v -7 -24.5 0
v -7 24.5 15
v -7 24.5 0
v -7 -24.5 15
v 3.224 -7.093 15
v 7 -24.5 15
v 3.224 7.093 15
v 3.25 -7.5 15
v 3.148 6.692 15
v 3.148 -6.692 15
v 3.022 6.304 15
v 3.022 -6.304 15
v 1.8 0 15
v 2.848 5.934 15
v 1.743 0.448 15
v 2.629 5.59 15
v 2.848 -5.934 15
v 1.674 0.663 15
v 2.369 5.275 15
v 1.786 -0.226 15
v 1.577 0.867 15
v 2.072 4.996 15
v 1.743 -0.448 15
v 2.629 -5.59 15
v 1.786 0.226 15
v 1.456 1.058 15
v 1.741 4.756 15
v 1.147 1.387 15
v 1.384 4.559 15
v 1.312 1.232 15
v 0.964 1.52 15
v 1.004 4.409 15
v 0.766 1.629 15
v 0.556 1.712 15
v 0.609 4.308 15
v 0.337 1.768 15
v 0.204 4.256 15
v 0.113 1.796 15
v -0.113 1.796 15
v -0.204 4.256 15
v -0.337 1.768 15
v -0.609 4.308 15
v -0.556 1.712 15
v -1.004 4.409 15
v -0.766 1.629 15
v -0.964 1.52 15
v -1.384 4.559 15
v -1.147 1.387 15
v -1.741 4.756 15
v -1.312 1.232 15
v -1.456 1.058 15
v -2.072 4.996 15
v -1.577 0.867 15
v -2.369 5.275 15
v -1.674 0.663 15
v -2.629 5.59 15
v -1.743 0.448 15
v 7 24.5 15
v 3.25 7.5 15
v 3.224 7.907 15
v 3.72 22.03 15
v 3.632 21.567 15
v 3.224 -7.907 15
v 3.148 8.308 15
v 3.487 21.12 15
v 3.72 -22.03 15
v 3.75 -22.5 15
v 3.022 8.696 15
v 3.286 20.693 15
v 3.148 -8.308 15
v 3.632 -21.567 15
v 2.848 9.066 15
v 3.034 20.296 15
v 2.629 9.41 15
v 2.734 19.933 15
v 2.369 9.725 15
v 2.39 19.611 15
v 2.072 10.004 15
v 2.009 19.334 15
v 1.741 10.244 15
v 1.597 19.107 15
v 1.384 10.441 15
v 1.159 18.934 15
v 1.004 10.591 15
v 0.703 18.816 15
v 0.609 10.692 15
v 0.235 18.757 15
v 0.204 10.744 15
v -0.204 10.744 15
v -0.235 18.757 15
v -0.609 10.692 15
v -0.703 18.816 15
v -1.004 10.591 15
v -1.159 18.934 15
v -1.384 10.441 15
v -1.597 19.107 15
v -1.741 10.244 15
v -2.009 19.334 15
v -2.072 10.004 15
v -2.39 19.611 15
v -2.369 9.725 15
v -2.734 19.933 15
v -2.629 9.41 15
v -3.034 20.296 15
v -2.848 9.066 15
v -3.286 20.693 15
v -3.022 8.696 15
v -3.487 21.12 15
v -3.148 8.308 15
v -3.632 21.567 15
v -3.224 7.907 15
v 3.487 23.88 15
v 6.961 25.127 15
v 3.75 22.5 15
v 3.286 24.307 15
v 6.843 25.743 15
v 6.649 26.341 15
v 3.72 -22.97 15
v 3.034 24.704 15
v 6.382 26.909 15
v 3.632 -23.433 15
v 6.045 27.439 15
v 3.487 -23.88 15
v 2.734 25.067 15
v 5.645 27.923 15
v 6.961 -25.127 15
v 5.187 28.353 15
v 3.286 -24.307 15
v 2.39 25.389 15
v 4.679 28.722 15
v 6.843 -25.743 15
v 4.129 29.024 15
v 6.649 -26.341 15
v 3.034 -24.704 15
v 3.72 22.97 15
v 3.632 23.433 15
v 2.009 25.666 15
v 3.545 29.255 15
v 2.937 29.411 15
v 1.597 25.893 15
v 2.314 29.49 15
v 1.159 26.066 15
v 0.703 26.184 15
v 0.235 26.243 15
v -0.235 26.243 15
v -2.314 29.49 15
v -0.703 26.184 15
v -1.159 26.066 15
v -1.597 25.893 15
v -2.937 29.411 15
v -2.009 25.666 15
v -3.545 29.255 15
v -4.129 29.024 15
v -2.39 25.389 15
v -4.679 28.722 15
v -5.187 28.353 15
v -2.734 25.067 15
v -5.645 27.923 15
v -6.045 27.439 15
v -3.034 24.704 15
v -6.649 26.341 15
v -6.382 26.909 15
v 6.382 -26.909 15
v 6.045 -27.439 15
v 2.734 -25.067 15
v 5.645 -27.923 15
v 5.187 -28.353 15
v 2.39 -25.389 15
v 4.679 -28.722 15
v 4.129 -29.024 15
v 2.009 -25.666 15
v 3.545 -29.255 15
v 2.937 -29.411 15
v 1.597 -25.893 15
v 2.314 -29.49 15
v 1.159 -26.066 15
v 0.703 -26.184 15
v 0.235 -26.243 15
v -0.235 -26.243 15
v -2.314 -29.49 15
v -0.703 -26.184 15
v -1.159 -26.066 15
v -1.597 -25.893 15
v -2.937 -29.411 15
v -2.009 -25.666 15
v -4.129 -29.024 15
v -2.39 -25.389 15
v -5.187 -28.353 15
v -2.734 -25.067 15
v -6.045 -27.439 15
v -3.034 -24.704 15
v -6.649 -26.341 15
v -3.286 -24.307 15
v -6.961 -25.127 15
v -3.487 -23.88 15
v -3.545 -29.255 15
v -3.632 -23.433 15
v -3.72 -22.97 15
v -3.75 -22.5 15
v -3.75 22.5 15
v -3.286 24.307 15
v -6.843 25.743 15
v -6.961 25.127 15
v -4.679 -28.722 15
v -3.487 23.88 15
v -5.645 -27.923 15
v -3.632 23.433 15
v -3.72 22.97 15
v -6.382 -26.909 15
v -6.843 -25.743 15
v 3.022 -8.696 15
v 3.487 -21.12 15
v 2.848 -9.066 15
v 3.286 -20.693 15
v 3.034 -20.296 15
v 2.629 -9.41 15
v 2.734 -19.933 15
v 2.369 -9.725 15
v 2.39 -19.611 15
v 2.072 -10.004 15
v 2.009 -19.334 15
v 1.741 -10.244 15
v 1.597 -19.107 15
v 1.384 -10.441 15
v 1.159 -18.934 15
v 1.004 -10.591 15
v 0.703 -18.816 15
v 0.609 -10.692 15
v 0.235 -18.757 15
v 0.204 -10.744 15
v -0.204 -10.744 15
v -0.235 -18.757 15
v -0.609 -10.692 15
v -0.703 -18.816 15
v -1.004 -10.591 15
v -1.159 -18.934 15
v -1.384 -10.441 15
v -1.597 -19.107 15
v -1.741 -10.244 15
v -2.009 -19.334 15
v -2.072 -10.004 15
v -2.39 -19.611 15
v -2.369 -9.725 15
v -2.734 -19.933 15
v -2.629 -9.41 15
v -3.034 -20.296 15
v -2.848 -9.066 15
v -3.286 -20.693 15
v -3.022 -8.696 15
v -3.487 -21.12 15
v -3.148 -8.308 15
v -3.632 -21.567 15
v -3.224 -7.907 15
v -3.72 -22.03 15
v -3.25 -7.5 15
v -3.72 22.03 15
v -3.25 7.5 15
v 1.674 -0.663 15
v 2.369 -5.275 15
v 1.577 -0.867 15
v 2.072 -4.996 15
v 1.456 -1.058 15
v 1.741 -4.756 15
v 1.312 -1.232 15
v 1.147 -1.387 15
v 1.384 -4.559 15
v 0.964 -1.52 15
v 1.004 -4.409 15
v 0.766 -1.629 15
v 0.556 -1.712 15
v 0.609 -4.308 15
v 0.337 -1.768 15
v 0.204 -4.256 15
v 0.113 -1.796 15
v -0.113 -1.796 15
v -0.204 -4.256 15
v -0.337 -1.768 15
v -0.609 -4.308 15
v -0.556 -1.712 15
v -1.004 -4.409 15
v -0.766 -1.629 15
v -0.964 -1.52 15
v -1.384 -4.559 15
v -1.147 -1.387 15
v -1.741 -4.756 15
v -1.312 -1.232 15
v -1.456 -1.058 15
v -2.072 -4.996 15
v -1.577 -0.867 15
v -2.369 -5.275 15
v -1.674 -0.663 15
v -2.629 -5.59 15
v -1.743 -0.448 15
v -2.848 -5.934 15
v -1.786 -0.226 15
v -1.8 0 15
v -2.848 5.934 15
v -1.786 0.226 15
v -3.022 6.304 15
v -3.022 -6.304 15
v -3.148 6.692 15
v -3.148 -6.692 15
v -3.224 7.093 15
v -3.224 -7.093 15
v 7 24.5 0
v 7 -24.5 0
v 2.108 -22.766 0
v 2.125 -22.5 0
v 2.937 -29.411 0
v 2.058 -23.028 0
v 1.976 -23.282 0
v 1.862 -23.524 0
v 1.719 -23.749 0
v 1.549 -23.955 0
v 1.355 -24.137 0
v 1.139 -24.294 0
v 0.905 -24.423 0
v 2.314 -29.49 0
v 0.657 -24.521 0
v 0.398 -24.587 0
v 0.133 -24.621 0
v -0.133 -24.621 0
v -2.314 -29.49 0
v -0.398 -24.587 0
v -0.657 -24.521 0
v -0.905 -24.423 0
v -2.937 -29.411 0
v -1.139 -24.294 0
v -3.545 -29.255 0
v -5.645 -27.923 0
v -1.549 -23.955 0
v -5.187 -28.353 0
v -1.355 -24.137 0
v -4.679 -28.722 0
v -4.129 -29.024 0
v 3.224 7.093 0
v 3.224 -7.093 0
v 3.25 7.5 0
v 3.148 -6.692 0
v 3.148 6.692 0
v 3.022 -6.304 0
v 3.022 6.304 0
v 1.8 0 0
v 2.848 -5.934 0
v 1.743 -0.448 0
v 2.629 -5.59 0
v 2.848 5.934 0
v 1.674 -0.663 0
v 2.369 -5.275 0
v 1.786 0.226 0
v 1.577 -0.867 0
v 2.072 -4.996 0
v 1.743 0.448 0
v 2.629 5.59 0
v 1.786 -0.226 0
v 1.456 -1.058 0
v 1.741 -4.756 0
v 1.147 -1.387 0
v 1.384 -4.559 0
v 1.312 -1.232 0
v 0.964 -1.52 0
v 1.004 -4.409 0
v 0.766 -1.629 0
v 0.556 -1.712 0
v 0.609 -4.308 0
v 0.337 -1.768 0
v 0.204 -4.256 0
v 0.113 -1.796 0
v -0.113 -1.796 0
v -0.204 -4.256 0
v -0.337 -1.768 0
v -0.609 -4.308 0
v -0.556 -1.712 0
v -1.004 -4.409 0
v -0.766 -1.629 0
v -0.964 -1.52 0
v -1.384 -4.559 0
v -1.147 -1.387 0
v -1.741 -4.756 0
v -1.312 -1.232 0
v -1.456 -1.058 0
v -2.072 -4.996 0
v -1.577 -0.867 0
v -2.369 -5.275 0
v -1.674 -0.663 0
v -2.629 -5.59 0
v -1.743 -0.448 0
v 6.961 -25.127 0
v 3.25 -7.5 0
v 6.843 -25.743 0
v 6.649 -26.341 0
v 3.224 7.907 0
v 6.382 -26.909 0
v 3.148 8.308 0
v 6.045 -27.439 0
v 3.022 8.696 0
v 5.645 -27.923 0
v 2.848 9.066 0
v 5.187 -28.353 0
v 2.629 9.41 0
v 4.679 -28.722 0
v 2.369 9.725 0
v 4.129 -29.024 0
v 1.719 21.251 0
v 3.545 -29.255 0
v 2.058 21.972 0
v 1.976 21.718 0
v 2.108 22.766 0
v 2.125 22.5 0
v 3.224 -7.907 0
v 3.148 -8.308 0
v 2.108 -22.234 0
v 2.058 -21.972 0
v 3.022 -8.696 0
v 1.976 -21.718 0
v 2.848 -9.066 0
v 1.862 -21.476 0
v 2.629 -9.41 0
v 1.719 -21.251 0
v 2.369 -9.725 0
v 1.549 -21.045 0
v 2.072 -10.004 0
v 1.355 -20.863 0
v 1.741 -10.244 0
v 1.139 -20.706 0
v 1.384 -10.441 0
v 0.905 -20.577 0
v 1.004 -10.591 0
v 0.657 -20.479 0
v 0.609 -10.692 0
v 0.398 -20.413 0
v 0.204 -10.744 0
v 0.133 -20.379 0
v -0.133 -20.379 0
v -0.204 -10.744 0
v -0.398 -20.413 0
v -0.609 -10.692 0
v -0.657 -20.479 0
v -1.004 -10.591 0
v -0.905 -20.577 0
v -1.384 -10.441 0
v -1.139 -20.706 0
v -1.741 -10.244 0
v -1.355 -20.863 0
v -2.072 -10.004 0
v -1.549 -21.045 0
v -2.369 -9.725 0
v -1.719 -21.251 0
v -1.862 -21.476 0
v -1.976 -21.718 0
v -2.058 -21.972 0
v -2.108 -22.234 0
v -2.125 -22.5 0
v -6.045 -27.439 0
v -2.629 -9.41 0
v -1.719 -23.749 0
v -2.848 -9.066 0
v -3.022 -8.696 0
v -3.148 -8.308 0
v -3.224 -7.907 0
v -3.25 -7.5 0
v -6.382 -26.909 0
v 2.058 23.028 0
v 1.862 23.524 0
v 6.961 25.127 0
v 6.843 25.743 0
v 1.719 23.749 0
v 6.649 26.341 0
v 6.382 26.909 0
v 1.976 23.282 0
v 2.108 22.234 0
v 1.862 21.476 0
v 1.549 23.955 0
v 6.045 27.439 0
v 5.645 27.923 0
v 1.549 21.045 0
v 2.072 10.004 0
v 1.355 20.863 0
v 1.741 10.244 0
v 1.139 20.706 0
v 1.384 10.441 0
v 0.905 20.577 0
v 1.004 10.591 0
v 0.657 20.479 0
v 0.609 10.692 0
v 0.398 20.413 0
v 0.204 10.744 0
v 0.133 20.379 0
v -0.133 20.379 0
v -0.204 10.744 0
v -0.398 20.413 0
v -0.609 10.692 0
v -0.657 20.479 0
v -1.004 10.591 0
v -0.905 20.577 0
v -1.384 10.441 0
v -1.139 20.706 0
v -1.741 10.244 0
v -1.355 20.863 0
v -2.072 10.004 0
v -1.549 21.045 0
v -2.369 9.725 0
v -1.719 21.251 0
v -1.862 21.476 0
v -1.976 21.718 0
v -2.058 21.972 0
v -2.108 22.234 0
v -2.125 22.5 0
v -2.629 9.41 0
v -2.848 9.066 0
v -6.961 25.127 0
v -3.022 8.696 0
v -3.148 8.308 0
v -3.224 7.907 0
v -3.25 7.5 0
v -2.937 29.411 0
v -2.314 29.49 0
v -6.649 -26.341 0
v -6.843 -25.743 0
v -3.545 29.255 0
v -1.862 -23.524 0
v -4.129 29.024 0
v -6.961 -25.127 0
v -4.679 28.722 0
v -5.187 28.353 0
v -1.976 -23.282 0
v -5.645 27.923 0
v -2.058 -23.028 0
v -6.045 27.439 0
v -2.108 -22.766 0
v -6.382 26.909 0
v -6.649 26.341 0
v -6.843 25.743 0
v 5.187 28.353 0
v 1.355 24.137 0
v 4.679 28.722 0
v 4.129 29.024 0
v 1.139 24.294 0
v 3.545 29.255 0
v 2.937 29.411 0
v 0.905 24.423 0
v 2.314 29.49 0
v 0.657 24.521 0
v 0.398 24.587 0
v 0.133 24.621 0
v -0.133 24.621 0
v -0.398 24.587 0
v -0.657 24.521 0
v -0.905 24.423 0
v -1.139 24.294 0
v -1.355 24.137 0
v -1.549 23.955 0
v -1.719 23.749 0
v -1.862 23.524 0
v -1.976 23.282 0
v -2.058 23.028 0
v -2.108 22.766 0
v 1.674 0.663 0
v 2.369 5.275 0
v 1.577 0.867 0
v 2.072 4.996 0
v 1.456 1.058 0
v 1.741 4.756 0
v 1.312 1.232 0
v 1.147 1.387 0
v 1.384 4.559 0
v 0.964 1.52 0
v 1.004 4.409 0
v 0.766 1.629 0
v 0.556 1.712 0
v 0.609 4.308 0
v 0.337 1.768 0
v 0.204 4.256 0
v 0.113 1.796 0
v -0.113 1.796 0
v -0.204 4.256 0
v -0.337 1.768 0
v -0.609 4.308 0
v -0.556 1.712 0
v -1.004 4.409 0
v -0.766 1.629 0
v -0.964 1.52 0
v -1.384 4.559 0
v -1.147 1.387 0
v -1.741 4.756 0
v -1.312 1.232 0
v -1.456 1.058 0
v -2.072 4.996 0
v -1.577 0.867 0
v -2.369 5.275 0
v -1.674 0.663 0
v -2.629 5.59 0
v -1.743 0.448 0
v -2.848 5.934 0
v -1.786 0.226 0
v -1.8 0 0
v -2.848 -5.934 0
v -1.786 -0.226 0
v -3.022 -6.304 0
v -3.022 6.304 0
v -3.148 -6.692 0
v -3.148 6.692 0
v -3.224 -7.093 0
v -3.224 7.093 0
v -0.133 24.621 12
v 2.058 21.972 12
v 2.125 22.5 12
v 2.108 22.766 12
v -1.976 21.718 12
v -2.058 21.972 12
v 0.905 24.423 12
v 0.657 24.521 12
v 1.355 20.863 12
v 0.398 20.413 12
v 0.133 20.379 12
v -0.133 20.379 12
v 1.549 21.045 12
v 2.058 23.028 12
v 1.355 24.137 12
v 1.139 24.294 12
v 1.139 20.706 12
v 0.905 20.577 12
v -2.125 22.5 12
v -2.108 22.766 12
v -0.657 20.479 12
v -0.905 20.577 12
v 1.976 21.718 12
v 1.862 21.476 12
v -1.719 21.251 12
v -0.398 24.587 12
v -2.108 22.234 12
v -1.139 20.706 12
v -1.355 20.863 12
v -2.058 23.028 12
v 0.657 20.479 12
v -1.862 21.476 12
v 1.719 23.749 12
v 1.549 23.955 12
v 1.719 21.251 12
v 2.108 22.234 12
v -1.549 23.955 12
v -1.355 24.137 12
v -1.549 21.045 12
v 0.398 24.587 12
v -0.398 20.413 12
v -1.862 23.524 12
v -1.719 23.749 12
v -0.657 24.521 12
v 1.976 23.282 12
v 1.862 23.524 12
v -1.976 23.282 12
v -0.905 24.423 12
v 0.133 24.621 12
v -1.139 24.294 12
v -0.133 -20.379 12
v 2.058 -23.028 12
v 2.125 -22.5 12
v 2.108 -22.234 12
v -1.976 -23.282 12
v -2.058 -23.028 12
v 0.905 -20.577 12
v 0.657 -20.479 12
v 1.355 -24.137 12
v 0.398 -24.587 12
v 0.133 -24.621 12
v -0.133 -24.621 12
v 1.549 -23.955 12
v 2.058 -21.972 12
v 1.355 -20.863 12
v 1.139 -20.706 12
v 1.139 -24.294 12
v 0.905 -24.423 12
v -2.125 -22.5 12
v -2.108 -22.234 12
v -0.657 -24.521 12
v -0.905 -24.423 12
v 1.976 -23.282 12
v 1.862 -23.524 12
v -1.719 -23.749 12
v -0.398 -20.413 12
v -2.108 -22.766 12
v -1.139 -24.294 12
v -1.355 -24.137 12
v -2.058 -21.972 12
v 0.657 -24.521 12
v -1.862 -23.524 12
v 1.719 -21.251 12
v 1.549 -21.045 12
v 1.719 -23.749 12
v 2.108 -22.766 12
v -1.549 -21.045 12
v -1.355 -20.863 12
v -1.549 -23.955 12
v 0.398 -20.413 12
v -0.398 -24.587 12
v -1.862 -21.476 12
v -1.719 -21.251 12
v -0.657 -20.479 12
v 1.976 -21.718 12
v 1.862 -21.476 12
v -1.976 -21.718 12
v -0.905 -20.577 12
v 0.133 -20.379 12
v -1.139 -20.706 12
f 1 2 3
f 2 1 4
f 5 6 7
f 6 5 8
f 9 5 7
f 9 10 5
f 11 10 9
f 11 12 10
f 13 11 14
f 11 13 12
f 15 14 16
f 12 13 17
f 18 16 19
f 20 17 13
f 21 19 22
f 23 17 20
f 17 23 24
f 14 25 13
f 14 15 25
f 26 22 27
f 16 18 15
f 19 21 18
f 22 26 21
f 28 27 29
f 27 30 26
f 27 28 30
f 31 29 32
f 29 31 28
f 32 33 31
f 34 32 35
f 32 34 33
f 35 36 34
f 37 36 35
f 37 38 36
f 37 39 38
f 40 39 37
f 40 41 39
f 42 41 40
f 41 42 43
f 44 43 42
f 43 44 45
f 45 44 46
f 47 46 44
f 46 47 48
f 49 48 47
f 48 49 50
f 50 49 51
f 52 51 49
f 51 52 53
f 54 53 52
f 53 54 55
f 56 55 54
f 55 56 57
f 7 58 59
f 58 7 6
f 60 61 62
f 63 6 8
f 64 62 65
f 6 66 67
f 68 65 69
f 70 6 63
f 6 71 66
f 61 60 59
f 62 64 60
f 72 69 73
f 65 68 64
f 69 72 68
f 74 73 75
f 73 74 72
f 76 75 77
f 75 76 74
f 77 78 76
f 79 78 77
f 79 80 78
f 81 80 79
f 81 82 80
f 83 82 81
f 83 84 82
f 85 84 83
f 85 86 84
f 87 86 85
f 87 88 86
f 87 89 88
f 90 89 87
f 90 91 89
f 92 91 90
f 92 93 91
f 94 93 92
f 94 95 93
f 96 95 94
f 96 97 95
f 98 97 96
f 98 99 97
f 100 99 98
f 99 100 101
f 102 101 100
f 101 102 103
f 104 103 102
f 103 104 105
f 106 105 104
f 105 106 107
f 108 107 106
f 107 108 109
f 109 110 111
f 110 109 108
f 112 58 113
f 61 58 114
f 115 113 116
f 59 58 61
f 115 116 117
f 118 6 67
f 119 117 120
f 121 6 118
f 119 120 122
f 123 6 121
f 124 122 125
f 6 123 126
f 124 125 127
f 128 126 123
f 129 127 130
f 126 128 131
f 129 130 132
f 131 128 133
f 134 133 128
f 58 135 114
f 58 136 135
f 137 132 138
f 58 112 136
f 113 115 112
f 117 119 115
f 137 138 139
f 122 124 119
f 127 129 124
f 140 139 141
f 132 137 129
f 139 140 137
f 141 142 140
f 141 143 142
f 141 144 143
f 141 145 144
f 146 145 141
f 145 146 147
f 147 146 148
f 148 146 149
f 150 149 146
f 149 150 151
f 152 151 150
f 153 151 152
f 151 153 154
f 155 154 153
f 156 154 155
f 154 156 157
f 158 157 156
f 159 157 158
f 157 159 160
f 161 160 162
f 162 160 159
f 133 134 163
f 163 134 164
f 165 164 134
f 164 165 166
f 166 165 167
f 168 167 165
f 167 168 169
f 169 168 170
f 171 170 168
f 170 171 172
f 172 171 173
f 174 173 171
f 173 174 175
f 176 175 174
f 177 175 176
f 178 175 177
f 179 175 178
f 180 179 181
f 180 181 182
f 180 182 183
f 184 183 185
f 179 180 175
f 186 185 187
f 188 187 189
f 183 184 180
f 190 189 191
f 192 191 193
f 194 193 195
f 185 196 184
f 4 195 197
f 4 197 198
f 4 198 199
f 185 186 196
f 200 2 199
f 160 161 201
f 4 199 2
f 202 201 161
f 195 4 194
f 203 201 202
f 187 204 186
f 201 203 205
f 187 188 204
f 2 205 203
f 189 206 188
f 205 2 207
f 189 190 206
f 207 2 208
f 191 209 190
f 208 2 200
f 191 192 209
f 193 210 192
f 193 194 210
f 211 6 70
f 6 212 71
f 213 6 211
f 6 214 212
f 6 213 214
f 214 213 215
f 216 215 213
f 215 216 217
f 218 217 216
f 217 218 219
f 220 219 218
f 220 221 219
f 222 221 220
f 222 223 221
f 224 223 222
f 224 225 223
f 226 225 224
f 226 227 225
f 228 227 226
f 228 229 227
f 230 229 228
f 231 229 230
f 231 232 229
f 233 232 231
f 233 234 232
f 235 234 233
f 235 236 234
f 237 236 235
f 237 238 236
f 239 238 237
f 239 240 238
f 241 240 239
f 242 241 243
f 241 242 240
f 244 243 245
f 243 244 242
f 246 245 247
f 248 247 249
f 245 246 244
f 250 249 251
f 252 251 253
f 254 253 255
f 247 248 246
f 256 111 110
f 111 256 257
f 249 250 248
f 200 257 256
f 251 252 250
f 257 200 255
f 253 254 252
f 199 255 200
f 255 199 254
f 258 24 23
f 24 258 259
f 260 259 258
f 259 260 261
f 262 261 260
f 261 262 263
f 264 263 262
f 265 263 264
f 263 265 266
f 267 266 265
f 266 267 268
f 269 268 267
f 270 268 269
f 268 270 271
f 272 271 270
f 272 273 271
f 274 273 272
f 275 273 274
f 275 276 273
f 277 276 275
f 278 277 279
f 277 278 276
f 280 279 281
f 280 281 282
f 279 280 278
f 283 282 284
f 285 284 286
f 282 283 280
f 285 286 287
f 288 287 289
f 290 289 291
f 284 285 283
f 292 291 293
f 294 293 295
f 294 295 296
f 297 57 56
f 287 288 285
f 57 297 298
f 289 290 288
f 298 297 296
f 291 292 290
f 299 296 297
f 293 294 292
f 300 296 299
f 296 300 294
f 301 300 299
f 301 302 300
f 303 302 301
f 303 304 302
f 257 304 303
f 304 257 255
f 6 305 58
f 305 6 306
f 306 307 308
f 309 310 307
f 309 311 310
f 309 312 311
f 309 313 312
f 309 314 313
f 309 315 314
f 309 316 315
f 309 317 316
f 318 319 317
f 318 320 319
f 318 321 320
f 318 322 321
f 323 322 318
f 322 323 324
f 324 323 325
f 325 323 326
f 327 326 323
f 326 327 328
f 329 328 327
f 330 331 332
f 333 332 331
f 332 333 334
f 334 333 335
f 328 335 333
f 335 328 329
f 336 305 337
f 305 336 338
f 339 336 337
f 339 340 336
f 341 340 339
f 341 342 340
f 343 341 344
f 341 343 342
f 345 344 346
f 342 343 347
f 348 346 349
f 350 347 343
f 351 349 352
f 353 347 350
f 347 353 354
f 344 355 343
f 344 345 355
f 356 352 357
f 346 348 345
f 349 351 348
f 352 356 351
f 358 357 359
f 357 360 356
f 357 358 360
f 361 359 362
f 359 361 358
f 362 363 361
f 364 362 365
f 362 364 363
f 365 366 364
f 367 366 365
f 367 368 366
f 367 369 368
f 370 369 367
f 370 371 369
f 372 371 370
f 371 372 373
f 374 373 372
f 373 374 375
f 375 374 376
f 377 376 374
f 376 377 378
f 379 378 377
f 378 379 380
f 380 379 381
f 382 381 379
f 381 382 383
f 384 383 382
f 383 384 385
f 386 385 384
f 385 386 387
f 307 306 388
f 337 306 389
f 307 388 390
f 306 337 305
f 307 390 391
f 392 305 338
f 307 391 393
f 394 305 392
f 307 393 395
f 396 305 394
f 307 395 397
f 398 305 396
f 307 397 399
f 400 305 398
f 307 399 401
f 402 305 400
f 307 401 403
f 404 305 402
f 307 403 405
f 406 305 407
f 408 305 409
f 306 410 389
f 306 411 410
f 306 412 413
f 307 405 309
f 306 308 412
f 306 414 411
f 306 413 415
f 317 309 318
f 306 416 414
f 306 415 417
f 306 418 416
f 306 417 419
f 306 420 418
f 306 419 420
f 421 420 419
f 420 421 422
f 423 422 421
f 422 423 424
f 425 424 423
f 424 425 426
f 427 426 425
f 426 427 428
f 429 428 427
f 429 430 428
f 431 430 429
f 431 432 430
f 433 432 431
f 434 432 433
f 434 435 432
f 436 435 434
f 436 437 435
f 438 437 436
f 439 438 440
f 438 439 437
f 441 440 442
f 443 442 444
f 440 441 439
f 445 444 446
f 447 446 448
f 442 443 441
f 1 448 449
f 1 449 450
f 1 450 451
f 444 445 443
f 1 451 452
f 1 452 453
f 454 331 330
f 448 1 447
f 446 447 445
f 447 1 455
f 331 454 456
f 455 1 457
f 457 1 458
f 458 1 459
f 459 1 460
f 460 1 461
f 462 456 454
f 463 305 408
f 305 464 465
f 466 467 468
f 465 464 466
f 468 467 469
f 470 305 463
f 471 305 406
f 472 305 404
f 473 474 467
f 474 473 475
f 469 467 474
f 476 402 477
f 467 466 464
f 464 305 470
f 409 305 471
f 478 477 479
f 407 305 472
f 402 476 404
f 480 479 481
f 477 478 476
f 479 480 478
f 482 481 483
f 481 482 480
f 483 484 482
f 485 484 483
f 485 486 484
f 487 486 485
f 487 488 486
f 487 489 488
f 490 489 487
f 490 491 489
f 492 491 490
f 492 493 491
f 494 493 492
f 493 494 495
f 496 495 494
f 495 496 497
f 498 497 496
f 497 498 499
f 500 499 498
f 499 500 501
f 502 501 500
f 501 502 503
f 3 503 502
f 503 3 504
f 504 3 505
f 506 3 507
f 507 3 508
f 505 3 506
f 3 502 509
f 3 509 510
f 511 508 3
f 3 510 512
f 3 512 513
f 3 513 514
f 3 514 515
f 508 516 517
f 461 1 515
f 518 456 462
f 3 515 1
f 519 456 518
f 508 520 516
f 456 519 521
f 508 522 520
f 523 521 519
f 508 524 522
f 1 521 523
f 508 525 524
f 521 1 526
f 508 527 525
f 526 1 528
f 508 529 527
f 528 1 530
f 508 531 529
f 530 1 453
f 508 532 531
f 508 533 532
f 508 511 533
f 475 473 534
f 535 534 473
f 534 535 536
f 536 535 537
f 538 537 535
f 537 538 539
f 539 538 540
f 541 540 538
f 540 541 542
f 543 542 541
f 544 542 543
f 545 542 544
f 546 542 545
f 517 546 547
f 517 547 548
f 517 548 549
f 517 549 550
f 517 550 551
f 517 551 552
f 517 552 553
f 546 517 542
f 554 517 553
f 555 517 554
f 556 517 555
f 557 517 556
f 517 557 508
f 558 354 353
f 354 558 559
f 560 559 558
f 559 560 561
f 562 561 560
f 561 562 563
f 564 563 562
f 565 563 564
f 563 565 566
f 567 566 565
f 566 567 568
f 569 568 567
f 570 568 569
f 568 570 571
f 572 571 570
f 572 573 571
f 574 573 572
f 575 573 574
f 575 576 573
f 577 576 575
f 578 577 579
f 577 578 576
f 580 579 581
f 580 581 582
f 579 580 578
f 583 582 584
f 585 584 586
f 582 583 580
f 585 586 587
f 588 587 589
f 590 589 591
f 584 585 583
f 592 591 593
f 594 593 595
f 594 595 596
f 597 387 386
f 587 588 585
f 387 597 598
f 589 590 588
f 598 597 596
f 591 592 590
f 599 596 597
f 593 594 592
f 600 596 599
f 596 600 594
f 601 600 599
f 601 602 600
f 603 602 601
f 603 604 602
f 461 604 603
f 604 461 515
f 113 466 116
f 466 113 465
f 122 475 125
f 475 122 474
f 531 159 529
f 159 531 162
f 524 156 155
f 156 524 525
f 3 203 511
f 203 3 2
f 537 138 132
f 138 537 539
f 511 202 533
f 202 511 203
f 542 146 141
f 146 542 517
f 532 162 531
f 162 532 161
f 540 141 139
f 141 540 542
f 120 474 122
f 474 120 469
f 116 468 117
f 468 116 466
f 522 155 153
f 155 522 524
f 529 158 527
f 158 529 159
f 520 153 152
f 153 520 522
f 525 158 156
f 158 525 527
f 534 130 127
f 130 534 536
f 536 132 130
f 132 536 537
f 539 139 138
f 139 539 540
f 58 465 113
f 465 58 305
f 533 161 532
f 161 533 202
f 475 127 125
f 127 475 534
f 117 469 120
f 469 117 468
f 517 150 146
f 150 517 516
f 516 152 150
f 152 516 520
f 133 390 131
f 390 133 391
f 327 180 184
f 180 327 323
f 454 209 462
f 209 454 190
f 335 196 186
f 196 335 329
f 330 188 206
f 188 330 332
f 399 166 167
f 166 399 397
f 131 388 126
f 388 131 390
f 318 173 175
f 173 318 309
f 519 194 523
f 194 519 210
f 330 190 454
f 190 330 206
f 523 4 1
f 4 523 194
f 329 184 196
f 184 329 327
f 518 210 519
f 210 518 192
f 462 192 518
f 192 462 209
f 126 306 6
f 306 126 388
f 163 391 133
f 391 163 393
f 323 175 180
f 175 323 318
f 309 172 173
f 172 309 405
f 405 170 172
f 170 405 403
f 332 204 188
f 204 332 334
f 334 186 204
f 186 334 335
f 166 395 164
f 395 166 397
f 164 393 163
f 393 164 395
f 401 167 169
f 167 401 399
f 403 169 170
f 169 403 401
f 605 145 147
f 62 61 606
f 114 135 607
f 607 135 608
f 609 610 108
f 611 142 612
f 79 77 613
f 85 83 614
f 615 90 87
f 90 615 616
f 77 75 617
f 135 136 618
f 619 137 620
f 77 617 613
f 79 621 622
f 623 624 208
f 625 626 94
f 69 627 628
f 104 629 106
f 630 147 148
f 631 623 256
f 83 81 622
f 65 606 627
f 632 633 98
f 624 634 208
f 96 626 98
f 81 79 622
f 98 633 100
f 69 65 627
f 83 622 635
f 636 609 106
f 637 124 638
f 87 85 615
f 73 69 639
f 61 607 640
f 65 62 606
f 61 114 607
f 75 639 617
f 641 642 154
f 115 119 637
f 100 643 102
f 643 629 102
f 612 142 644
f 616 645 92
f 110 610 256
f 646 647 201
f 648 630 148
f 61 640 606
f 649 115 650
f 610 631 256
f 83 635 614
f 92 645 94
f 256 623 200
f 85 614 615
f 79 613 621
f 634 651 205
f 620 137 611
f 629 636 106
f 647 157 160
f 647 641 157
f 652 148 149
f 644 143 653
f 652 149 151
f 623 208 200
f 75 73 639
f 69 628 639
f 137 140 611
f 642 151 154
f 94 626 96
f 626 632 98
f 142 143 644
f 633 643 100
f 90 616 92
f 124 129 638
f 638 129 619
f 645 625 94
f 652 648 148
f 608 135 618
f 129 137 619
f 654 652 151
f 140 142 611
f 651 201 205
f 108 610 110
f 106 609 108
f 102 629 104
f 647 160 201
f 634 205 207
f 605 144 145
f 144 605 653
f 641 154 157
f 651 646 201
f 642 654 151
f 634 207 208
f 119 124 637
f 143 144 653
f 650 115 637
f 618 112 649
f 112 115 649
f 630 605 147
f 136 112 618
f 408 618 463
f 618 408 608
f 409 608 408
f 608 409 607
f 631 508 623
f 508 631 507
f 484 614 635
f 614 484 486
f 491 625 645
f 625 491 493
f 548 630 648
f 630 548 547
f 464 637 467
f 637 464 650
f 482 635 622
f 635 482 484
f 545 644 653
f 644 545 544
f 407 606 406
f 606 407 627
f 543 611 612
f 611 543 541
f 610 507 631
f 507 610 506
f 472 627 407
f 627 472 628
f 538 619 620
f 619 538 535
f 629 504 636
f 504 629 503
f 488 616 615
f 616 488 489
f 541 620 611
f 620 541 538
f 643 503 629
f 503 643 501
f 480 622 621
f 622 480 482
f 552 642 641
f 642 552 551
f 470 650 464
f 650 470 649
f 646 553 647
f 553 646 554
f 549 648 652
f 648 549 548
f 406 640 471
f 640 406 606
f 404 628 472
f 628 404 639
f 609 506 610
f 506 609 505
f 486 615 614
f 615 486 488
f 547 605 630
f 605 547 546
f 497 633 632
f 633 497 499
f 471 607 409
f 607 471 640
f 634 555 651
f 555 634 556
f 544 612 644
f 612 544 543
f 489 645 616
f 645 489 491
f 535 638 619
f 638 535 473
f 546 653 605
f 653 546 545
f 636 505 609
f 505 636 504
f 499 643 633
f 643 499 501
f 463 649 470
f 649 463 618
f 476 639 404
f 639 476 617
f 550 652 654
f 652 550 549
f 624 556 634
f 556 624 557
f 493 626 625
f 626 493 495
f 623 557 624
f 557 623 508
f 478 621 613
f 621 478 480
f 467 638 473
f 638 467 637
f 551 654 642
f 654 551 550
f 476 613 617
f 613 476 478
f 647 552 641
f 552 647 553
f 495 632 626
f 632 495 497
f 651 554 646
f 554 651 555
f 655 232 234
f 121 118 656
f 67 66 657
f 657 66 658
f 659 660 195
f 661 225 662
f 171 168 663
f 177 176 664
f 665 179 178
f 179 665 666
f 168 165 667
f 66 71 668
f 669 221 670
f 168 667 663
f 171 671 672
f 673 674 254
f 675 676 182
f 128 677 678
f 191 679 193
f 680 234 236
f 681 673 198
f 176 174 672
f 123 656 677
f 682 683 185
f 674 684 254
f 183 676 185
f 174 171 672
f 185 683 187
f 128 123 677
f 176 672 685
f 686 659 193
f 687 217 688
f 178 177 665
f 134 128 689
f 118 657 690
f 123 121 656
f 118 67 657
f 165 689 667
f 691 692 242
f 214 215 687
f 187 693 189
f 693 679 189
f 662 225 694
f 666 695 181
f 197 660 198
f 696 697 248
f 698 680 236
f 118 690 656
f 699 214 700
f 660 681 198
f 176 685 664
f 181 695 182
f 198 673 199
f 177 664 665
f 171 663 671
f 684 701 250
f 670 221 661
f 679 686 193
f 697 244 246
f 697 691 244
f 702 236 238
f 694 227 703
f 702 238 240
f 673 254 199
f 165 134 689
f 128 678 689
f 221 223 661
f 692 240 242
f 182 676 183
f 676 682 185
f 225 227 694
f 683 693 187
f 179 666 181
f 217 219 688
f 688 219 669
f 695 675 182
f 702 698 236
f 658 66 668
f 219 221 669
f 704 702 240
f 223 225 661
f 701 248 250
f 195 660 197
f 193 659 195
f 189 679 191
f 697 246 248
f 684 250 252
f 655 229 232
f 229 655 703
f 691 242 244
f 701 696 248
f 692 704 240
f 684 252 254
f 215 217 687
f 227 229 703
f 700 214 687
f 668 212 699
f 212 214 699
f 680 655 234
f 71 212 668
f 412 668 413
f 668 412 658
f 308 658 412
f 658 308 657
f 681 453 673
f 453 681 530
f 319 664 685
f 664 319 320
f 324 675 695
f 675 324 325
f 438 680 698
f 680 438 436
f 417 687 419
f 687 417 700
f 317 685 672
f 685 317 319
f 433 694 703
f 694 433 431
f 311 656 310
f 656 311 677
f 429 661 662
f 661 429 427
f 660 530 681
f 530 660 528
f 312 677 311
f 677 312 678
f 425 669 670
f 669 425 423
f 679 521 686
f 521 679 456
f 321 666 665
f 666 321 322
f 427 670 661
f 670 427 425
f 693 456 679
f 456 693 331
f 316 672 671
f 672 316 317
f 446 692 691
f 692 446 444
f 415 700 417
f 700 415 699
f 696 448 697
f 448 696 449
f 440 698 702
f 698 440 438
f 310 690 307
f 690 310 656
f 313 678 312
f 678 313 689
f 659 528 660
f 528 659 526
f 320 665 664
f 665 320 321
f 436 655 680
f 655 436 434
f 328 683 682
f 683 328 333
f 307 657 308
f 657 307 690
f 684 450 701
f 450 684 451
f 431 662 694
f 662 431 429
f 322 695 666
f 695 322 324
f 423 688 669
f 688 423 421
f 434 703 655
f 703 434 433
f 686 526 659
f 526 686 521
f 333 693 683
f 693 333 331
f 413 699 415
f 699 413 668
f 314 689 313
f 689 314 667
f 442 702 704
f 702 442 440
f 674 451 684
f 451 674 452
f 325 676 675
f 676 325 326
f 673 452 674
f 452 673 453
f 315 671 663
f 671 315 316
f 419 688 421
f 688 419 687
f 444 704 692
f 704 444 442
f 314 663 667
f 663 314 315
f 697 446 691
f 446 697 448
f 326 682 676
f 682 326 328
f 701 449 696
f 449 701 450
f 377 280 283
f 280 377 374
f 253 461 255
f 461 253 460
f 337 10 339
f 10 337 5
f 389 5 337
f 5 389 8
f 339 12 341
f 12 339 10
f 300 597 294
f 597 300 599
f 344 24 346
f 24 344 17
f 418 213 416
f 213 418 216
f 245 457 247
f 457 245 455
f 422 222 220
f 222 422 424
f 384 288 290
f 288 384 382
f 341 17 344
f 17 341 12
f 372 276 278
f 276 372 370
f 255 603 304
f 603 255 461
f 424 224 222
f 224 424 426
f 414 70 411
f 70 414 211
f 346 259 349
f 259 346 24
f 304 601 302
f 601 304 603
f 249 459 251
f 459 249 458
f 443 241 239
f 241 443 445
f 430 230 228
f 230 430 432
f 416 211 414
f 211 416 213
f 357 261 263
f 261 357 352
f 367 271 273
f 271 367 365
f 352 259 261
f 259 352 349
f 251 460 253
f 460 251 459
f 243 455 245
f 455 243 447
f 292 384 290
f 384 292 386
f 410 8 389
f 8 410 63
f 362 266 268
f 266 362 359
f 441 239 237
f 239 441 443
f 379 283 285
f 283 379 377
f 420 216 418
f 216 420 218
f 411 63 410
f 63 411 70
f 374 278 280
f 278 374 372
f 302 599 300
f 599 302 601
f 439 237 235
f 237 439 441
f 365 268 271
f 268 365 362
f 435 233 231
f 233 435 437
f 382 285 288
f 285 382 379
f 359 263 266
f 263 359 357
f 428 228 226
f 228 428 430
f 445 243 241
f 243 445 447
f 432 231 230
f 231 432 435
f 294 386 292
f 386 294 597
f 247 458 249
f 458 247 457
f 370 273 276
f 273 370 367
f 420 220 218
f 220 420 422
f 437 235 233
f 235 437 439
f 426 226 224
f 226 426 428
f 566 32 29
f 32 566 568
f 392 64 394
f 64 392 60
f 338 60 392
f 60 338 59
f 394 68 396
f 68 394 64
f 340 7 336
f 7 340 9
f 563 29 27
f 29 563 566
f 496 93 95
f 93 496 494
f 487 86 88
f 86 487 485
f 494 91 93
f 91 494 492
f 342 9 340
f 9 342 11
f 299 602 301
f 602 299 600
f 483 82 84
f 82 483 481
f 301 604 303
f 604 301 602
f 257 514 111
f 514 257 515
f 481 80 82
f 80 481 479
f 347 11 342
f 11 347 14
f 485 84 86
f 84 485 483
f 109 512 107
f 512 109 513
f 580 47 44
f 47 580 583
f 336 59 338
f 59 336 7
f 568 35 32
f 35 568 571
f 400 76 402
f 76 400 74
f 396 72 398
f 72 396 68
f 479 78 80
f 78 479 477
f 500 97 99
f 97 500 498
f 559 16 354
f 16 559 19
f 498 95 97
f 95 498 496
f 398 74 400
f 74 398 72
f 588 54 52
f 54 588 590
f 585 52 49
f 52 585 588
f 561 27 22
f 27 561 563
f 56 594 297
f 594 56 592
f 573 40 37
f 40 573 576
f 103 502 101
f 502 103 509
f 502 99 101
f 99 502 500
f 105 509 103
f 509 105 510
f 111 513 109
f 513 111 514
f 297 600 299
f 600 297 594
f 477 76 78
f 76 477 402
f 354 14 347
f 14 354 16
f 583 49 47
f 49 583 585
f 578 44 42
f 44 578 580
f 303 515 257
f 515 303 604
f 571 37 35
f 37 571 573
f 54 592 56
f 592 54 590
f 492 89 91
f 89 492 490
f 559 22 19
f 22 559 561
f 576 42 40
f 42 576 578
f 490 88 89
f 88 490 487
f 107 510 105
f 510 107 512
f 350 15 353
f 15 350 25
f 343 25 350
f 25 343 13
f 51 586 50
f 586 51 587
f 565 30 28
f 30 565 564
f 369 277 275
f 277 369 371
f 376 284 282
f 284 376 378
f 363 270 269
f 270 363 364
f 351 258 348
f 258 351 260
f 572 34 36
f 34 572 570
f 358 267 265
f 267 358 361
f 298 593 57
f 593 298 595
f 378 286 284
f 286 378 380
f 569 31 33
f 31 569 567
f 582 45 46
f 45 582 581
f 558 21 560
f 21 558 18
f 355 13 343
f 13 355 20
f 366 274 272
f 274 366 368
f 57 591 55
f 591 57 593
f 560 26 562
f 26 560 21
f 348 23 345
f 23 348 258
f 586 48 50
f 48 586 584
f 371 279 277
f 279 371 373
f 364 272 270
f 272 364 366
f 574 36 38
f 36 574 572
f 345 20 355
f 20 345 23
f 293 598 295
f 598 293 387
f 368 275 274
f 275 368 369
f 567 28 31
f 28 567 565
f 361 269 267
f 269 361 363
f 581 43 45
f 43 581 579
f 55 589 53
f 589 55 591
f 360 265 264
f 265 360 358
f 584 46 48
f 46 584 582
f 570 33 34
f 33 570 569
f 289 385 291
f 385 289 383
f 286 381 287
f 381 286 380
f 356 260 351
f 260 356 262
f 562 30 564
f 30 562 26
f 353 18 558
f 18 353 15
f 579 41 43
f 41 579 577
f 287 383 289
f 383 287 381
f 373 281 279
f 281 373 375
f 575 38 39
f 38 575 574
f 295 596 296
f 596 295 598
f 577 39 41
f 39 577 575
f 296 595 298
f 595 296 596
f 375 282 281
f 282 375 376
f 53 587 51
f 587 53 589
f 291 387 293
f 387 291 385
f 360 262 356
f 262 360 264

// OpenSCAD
$fn = 50;


difference() {
	union() {
		hull() {
			translate(v = [-2.0000000000, 9.5000000000, 0]) {
				cylinder(h = 15, r = 5);
			}
			translate(v = [2.0000000000, 9.5000000000, 0]) {
				cylinder(h = 15, r = 5);
			}
			translate(v = [-2.0000000000, -9.5000000000, 0]) {
				cylinder(h = 15, r = 5);
			}
			translate(v = [2.0000000000, -9.5000000000, 0]) {
				cylinder(h = 15, r = 5);
			}
		}
		translate(v = [0.0000000000, 15.0000000000, 0]) {
			hull() {
				translate(v = [-2.0000000000, 9.5000000000, 0]) {
					cylinder(h = 15, r = 5);
				}
				translate(v = [2.0000000000, 9.5000000000, 0]) {
					cylinder(h = 15, r = 5);
				}
				translate(v = [-2.0000000000, -9.5000000000, 0]) {
					cylinder(h = 15, r = 5);
				}
				translate(v = [2.0000000000, -9.5000000000, 0]) {
					cylinder(h = 15, r = 5);
				}
			}
		}
		translate(v = [0.0000000000, 15.0000000000, 0]) {
			hull() {
				translate(v = [-2.0000000000, 9.5000000000, 0]) {
					cylinder(h = 15, r = 5);
				}
				translate(v = [2.0000000000, 9.5000000000, 0]) {
					cylinder(h = 15, r = 5);
				}
				translate(v = [-2.0000000000, -9.5000000000, 0]) {
					cylinder(h = 15, r = 5);
				}
				translate(v = [2.0000000000, -9.5000000000, 0]) {
					cylinder(h = 15, r = 5);
				}
			}
		}
		translate(v = [0.0000000000, -15.0000000000, 0]) {
			hull() {
				translate(v = [-2.0000000000, 9.5000000000, 0]) {
					cylinder(h = 15, r = 5);
				}
				translate(v = [2.0000000000, 9.5000000000, 0]) {
					cylinder(h = 15, r = 5);
				}
				translate(v = [-2.0000000000, -9.5000000000, 0]) {
					cylinder(h = 15, r = 5);
				}
				translate(v = [2.0000000000, -9.5000000000, 0]) {
					cylinder(h = 15, r = 5);
				}
			}
		}
		translate(v = [0.0000000000, -15.0000000000, 0]) {
			hull() {
				translate(v = [-2.0000000000, 9.5000000000, 0]) {
					cylinder(h = 15, r = 5);
				}
				translate(v = [2.0000000000, 9.5000000000, 0]) {
					cylinder(h = 15, r = 5);
				}
				translate(v = [-2.0000000000, -9.5000000000, 0]) {
					cylinder(h = 15, r = 5);
				}
				translate(v = [2.0000000000, -9.5000000000, 0]) {
					cylinder(h = 15, r = 5);
				}
			}
		}
	}
	union() {
		translate(v = [0.0000000000, 22.5000000000, 15]) {
			rotate(a = [0, 0, 0]) {
				difference() {
					union() {
						#translate(v = [0, 0, -15.0000000000]) {
							cylinder(h = 15, r = 2.0000000000);
						}
						#translate(v = [0, 0, -3]) {
							cylinder(h = 3, r1 = 2.1250000000, r2 = 3.7500000000);
						}
						#translate(v = [0, 0, -15.0000000000]) {
							cylinder(h = 15, r = 2.1250000000);
						}
						#translate(v = [0, 0, -15.0000000000]) {
							cylinder(h = 15, r = 2.0000000000);
						}
					}
					union();
				}
			}
		}
		translate(v = [0.0000000000, 22.5000000000, 15]) {
			rotate(a = [0, 0, 0]) {
				difference() {
					union() {
						#translate(v = [0, 0, -15.0000000000]) {
							cylinder(h = 15, r = 2.0000000000);
						}
						#translate(v = [0, 0, -3]) {
							cylinder(h = 3, r1 = 2.1250000000, r2 = 3.7500000000);
						}
						#translate(v = [0, 0, -15.0000000000]) {
							cylinder(h = 15, r = 2.1250000000);
						}
						#translate(v = [0, 0, -15.0000000000]) {
							cylinder(h = 15, r = 2.0000000000);
						}
					}
					union();
				}
			}
		}
		translate(v = [0.0000000000, -22.5000000000, 15]) {
			rotate(a = [0, 0, 0]) {
				difference() {
					union() {
						#translate(v = [0, 0, -15.0000000000]) {
							cylinder(h = 15, r = 2.0000000000);
						}
						#translate(v = [0, 0, -3]) {
							cylinder(h = 3, r1 = 2.1250000000, r2 = 3.7500000000);
						}
						#translate(v = [0, 0, -15.0000000000]) {
							cylinder(h = 15, r = 2.1250000000);
						}
						#translate(v = [0, 0, -15.0000000000]) {
							cylinder(h = 15, r = 2.0000000000);
						}
					}
					union();
				}
			}
		}
		translate(v = [0.0000000000, -22.5000000000, 15]) {
			rotate(a = [0, 0, 0]) {
				difference() {
					union() {
						#translate(v = [0, 0, -15.0000000000]) {
							cylinder(h = 15, r = 2.0000000000);
						}
						#translate(v = [0, 0, -3]) {
							cylinder(h = 3, r1 = 2.1250000000, r2 = 3.7500000000);
						}
						#translate(v = [0, 0, -15.0000000000]) {
							cylinder(h = 15, r = 2.1250000000);
						}
						#translate(v = [0, 0, -15.0000000000]) {
							cylinder(h = 15, r = 2.0000000000);
						}
					}
					union();
				}
			}
		}
		translate(v = [0.0000000000, -7.5000000000, 0]) {
			translate(v = [0, 0, -100]) {
				cylinder(h = 200, r = 3.2500000000);
			}
		}
		translate(v = [0.0000000000, 7.5000000000, 0]) {
			translate(v = [0, 0, -100]) {
				cylinder(h = 200, r = 3.2500000000);
			}
		}
		translate(v = [0.0000000000, -7.5000000000, 0]) {
			translate(v = [0, 0, -100]) {
				cylinder(h = 200, r = 1.8000000000);
			}
		}
		translate(v = [0, 0, -100]) {
			cylinder(h = 200, r = 1.8000000000);
		}
		translate(v = [0.0000000000, 7.5000000000, 0]) {
			translate(v = [0, 0, -100]) {
				cylinder(h = 200, r = 1.8000000000);
			}
		}
	}
}
